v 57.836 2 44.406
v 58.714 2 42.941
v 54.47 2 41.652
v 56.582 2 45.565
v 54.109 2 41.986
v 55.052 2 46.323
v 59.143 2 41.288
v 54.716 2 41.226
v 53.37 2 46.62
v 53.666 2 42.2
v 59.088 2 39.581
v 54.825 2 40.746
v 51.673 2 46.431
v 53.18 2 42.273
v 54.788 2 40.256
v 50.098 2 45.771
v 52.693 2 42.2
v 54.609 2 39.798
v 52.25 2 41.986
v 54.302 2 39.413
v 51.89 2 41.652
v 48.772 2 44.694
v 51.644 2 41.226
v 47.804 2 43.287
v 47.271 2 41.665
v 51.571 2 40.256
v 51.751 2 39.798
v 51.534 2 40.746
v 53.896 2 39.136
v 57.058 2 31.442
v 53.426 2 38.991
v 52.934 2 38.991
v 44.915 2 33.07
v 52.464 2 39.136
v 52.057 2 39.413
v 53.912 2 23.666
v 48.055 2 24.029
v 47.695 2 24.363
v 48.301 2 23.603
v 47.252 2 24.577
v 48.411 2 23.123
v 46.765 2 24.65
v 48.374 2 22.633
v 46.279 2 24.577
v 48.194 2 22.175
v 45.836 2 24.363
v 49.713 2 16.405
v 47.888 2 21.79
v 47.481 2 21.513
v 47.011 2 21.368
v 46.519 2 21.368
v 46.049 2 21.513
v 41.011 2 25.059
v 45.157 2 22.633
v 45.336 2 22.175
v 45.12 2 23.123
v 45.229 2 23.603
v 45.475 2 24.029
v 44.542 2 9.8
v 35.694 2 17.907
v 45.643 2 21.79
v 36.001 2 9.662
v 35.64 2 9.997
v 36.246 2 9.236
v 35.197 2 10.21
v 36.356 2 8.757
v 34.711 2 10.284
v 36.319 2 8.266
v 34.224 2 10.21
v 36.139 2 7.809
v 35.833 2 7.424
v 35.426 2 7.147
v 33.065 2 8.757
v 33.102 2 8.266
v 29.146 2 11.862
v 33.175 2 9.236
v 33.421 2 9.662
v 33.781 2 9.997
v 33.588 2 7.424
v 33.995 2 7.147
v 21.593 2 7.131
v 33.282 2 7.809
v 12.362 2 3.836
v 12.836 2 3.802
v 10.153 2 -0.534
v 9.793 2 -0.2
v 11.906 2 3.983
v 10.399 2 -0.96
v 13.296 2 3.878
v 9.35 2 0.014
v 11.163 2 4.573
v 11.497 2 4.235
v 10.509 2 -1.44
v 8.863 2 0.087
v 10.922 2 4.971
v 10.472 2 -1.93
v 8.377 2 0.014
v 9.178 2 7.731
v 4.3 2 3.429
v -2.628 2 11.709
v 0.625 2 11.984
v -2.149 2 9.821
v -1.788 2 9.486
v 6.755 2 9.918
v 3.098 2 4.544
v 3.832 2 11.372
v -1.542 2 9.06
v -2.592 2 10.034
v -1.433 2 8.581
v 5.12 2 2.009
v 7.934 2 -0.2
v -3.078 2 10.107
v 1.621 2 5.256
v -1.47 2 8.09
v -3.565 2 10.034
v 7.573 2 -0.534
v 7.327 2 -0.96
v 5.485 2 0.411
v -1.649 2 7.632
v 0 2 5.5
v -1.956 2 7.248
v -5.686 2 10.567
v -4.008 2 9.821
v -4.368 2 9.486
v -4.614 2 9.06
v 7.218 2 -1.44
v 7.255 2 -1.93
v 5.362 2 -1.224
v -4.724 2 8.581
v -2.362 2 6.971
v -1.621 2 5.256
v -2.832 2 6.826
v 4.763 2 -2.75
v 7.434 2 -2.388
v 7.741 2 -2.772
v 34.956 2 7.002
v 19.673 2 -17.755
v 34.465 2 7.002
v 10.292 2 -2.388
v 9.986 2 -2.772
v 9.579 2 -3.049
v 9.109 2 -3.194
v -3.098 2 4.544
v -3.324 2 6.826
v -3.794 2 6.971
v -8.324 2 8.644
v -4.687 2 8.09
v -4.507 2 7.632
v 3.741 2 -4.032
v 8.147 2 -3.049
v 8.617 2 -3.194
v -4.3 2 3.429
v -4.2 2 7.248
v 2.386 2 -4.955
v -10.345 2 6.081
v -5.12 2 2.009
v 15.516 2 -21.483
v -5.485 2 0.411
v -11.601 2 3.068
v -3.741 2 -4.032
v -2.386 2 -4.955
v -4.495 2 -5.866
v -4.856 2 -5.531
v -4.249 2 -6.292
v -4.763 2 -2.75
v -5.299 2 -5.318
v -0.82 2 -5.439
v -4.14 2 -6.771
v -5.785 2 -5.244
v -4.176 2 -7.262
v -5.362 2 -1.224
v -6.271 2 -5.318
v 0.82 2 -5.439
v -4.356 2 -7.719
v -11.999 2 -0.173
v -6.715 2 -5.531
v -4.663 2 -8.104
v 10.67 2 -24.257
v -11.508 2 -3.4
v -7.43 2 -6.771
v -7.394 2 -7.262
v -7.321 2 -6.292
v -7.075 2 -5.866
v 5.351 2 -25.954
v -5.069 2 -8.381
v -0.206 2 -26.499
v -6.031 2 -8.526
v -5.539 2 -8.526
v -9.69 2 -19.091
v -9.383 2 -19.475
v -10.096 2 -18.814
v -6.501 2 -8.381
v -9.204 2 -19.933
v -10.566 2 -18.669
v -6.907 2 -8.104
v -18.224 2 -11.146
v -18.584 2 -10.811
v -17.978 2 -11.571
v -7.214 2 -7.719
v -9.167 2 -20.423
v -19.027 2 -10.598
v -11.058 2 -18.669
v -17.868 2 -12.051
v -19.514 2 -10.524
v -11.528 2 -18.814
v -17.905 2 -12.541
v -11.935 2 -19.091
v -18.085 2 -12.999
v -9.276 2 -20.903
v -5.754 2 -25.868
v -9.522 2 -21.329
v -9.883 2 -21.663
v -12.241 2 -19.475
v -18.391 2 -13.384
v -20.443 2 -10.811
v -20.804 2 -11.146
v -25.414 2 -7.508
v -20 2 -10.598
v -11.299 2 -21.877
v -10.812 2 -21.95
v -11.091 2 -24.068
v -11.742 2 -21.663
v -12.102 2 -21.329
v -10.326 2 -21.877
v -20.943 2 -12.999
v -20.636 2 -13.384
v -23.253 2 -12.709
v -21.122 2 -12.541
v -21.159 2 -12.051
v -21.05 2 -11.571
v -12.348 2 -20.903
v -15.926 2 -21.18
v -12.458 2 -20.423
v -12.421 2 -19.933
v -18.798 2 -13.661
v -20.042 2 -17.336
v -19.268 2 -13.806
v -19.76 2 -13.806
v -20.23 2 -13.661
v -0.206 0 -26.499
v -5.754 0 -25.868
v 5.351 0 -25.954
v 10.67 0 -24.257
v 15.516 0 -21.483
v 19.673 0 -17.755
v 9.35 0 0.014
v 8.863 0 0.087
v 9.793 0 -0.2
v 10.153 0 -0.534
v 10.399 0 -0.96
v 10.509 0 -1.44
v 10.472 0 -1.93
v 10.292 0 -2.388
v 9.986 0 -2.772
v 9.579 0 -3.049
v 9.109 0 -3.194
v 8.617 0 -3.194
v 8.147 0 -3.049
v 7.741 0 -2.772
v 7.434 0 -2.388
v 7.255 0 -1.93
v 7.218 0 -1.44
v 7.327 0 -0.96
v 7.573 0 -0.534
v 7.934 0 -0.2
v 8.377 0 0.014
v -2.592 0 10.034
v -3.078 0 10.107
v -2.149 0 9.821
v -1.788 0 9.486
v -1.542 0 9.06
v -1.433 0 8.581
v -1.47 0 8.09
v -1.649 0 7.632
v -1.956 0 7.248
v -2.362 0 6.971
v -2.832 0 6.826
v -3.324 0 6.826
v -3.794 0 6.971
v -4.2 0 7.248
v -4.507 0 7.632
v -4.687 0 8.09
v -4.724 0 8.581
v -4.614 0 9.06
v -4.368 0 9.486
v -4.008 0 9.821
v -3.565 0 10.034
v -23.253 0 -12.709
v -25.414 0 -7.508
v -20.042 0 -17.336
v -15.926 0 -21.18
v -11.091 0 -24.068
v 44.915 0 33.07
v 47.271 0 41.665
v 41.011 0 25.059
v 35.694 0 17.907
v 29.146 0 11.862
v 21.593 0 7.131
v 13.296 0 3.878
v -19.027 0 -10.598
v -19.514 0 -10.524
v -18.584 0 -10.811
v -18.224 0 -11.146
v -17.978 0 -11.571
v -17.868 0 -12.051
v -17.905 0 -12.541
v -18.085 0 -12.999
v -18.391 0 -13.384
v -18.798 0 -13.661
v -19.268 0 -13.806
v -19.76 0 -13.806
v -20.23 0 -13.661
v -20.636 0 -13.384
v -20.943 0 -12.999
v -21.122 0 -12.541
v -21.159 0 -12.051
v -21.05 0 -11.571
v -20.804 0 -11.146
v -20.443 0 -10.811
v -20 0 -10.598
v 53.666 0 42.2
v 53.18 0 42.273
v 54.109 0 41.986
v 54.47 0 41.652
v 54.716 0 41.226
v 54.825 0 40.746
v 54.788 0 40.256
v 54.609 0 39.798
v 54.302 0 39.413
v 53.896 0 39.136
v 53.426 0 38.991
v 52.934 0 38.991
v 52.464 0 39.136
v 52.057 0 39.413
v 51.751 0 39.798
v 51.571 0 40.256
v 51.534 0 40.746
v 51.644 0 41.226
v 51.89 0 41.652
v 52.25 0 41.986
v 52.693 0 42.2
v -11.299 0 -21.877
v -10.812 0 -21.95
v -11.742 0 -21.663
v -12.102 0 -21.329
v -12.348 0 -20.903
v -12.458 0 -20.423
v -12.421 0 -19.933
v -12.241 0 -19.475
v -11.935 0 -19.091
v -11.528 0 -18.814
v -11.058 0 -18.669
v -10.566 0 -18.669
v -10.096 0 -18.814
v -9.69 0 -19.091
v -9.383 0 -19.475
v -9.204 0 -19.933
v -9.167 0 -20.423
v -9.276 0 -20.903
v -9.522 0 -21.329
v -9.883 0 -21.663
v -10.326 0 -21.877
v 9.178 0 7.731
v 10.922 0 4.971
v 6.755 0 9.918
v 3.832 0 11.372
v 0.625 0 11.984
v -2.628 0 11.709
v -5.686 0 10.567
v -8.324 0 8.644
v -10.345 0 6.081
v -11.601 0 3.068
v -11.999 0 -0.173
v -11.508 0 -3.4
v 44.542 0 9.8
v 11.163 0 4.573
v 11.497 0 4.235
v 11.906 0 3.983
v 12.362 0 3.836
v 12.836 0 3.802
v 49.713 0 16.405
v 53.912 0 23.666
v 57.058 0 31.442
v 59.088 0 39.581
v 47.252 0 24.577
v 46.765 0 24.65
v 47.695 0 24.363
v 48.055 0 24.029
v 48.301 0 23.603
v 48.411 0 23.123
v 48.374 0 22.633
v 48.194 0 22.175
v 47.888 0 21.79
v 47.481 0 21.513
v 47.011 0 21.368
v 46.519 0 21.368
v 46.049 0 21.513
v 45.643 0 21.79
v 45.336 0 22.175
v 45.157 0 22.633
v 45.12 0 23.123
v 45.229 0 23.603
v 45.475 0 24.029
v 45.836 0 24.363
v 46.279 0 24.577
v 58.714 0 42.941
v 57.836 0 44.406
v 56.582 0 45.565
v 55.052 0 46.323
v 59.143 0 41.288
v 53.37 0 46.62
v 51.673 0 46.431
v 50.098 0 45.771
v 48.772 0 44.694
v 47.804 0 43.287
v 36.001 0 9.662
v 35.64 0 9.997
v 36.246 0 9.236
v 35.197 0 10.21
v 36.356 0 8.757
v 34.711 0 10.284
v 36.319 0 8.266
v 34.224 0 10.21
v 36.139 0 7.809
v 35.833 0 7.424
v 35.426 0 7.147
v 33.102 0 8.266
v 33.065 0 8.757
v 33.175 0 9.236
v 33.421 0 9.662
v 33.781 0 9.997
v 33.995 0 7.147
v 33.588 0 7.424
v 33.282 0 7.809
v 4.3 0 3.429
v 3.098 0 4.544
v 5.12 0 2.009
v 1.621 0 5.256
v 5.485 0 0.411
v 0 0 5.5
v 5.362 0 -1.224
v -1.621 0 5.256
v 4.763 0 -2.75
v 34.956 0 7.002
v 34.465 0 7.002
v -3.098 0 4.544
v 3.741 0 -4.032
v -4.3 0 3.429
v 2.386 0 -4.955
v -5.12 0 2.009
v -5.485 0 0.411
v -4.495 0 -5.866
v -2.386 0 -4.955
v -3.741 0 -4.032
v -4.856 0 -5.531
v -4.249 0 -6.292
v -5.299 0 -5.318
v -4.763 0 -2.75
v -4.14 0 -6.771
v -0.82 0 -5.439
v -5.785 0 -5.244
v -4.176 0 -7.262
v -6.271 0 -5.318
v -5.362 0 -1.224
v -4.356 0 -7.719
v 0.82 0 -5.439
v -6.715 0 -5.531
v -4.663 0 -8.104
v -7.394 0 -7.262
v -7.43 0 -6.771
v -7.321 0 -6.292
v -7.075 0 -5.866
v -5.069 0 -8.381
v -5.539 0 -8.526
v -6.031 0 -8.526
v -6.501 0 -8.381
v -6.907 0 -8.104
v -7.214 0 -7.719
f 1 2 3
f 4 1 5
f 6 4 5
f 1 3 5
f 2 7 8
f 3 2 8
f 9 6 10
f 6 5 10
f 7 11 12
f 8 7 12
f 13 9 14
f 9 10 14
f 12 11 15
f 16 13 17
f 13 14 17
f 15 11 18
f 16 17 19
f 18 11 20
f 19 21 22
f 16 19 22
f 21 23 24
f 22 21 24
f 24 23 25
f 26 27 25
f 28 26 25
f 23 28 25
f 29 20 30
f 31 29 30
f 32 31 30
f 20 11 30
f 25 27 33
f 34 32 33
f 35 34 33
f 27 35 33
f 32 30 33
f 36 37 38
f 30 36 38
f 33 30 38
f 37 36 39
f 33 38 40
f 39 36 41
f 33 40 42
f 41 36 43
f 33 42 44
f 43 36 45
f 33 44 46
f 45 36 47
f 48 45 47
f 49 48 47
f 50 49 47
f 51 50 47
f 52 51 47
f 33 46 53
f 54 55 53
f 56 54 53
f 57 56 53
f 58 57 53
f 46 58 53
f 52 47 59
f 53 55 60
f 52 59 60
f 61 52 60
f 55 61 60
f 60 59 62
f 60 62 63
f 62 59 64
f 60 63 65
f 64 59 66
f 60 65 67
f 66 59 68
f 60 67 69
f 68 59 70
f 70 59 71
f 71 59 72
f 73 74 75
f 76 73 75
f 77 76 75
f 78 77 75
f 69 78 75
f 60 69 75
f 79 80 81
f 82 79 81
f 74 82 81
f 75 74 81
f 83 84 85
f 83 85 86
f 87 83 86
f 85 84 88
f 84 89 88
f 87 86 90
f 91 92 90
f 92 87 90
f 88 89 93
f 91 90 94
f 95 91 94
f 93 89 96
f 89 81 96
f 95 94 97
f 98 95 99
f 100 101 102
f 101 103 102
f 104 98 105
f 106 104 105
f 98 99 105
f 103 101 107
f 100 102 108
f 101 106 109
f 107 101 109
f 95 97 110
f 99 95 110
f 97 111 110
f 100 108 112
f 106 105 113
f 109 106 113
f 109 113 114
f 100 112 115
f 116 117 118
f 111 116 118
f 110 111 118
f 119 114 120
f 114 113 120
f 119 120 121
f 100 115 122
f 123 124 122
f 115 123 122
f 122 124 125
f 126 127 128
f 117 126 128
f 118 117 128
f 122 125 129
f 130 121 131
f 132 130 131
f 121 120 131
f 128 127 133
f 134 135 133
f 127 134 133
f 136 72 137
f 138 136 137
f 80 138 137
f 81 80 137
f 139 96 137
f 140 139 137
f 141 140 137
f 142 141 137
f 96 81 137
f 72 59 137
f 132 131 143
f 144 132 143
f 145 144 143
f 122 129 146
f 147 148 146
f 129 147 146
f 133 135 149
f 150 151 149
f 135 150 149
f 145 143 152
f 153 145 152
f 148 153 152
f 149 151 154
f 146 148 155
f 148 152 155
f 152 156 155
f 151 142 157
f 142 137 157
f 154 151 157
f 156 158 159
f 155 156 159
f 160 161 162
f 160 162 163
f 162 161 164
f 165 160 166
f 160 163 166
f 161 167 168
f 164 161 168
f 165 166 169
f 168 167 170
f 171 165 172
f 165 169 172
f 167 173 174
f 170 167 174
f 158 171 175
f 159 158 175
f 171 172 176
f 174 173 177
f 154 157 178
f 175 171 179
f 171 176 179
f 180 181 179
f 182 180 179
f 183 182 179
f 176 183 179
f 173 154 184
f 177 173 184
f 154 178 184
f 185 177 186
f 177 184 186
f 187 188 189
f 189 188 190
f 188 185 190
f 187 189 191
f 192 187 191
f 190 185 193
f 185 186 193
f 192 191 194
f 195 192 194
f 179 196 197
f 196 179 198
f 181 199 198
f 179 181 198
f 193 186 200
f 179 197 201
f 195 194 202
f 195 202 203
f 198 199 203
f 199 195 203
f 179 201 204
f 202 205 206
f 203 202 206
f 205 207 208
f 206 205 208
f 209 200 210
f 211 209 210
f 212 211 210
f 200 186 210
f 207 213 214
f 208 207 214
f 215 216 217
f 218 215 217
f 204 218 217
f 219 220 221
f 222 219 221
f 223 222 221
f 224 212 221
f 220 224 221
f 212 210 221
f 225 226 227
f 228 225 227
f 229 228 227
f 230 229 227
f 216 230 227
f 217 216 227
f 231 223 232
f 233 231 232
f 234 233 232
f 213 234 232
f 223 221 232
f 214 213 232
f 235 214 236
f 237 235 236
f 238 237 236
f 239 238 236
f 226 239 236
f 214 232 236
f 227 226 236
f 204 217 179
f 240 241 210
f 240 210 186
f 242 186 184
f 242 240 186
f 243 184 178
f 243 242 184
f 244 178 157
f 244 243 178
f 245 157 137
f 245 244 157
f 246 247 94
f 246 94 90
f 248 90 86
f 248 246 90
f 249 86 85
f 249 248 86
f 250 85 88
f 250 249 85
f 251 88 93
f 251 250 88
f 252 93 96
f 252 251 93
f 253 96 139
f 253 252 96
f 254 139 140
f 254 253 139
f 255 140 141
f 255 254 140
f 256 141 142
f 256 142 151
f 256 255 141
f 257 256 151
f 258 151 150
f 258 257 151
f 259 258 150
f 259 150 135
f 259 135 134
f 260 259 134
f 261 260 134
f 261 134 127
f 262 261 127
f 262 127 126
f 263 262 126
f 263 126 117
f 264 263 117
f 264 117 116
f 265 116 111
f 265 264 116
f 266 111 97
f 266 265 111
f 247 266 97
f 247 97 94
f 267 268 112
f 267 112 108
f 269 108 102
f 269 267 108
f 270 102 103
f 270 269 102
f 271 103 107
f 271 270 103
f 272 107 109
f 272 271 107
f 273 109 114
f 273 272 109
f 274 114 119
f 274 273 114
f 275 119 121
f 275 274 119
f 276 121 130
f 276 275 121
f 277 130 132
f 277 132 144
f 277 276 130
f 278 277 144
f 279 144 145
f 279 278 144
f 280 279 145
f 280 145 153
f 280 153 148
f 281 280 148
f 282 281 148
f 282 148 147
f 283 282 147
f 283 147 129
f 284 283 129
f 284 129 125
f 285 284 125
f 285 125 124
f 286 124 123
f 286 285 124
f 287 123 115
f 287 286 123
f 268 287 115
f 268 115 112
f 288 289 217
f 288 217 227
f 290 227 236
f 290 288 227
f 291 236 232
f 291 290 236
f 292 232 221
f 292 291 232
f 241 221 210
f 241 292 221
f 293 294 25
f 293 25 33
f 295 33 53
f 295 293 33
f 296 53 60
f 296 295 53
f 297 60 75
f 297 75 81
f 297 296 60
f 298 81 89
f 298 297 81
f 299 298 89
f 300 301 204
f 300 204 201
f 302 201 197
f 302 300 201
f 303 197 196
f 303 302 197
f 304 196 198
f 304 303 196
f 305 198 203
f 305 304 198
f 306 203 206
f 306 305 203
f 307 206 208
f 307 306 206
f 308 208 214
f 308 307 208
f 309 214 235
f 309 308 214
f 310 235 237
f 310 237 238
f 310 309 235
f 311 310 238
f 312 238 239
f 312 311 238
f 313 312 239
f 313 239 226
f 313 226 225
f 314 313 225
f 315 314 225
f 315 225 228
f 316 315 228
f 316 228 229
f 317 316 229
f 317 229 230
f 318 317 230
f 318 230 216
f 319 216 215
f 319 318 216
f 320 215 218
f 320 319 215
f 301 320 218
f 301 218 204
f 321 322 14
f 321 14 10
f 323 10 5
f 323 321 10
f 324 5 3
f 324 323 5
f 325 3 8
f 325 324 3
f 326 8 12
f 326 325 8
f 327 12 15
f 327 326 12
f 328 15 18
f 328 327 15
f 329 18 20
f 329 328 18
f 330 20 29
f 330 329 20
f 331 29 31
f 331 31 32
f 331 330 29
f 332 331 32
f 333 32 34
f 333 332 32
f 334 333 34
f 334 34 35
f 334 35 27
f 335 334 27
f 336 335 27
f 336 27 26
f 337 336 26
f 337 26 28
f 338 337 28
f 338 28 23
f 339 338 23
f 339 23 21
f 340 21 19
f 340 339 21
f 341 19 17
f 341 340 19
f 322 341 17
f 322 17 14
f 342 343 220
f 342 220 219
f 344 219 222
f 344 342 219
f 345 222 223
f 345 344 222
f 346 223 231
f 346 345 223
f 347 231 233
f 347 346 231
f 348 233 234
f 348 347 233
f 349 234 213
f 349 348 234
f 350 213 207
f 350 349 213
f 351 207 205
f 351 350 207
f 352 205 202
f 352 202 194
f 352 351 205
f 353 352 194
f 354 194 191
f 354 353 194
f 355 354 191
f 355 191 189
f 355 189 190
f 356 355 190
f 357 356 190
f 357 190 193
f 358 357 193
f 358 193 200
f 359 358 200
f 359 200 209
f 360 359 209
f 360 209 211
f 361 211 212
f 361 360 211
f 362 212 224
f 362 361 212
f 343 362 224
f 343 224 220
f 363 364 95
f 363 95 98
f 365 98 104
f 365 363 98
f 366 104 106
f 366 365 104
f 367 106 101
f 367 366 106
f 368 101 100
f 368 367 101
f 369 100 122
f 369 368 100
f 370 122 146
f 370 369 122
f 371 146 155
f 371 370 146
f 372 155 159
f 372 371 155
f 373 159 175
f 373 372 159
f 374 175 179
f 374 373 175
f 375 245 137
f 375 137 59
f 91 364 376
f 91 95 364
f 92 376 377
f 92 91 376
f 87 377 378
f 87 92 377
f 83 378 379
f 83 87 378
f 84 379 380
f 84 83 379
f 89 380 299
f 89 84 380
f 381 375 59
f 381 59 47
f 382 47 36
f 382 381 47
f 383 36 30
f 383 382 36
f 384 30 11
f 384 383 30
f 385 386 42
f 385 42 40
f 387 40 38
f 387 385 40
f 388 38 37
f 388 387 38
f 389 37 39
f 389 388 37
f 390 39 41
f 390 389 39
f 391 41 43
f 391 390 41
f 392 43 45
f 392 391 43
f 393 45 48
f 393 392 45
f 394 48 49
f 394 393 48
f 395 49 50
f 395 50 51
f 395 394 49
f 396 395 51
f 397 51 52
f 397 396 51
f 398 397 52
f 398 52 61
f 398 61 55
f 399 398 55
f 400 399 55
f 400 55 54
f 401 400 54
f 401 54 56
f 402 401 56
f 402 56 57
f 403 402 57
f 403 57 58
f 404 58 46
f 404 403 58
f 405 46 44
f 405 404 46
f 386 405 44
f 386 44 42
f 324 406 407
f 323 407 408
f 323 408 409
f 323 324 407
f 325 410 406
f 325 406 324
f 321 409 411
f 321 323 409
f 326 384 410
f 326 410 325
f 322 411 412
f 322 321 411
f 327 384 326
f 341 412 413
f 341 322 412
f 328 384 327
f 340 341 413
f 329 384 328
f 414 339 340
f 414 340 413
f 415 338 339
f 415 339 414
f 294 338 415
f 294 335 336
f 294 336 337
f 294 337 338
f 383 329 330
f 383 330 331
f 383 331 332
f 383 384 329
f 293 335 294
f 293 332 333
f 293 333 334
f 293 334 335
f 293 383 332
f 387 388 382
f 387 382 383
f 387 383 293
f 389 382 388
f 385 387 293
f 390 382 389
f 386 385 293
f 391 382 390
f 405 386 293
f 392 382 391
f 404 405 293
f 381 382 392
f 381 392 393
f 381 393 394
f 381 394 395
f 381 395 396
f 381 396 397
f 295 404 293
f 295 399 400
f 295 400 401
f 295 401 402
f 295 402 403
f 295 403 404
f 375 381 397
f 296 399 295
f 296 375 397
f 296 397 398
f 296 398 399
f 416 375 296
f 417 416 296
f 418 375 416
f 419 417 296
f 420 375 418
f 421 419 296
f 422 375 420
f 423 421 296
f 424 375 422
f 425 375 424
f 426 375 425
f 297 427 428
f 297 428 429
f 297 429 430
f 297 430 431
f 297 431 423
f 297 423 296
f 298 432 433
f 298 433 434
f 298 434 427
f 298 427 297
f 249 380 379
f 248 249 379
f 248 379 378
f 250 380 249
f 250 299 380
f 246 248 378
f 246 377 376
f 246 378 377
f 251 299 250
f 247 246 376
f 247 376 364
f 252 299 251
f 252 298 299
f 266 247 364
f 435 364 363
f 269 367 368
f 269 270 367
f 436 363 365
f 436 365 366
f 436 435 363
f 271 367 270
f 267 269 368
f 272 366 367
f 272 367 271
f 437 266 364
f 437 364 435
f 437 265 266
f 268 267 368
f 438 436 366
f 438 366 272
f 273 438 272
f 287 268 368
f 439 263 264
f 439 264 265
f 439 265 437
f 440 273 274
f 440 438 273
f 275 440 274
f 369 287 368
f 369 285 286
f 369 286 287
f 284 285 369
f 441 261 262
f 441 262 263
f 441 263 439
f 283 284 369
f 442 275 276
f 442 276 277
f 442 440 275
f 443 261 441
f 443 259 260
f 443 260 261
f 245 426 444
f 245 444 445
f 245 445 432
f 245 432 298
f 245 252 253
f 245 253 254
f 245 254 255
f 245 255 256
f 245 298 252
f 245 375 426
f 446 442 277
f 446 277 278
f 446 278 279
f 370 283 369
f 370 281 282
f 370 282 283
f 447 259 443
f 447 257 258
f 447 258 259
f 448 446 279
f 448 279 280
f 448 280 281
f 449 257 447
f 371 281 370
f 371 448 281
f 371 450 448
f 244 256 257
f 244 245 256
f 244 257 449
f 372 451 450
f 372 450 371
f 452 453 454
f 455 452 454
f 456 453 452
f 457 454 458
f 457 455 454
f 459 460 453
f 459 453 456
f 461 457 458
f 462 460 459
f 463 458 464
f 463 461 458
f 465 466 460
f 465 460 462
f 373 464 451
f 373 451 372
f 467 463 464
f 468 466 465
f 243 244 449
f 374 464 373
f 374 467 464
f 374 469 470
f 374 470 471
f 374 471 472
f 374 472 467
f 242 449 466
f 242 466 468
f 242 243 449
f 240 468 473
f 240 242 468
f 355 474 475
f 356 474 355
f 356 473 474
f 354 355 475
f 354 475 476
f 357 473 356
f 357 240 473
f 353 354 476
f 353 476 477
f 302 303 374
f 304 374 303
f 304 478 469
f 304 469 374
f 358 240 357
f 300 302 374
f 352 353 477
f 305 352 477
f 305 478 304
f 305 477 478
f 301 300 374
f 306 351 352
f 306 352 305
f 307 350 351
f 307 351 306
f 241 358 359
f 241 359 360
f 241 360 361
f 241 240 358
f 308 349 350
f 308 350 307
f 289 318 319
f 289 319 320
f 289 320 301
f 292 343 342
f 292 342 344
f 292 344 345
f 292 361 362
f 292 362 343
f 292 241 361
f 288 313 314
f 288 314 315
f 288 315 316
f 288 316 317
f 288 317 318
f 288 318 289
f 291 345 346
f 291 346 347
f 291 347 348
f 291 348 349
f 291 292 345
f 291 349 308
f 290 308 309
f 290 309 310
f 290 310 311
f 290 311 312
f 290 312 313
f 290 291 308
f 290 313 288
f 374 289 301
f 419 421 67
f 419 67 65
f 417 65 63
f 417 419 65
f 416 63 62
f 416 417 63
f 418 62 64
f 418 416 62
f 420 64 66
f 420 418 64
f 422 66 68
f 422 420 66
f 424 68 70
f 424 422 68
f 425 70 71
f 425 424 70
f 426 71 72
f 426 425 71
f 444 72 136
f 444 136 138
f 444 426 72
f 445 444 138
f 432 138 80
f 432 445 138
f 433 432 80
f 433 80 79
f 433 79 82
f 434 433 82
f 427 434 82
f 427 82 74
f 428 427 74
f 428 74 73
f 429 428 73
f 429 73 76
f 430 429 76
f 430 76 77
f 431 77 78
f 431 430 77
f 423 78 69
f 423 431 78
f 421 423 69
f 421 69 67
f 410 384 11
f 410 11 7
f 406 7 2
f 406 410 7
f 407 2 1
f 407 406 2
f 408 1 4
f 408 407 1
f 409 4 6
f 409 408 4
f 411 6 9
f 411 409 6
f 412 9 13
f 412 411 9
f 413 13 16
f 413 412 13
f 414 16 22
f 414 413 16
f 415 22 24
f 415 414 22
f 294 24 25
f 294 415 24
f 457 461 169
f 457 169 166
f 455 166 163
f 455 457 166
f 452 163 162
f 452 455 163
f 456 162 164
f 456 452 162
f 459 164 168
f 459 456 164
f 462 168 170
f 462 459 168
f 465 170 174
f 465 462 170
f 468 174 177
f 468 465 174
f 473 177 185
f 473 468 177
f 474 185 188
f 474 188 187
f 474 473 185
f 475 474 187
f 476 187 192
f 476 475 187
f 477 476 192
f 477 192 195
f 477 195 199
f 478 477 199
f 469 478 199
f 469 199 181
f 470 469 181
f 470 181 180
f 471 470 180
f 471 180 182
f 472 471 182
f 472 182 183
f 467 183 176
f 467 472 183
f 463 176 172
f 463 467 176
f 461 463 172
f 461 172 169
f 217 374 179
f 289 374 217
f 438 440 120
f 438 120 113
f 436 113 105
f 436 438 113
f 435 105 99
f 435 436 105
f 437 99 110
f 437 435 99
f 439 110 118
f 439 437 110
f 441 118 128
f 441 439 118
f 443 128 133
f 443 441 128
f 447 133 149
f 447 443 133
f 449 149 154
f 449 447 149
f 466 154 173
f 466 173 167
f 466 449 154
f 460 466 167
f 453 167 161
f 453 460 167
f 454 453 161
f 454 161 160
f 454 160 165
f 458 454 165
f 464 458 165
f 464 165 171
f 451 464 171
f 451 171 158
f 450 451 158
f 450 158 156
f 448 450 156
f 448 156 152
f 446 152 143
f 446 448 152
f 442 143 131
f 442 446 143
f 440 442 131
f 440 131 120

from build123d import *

# Parameters (mm, degrees)
SKETCH_1_R         = 1.65
SKETCH_1_R_2       = 5.5
EXTRUDE_2450_DEPTH = 2
FILLET_1_R         = 2


with BuildPart() as part:
    # Эскиз1 → Extrude 2450 (new body)
    with BuildSketch(Plane(origin=(0, 0, 0), x_dir=(1, 0, 0), z_dir=(0, 1, 0))):
        with BuildLine():
            Line((-11.508257905, 3.4), (-25.414069539, 7.508333333))
            ThreePointArc((-25.414069539, 7.508333333), (-18.086736192, 19.368014197), (-5.754049101, 25.86775829))
            ThreePointArc((-5.754049101, 25.86775829), (8.055154344, 25.246078676), (19.6725691, 17.755))
            Line((19.6725691, 17.755), (44.541665887, -9.8))
            ThreePointArc((44.541665887, -9.8), (53.912240119, -23.666174502), (59.088465181, -39.58110934))
            ThreePointArc((59.088465181, -39.58110934), (54.221507729, -46.531844924), (47.270772145, -41.664887472))
            ThreePointArc((47.270772145, -41.664887472), (35.068418794, -17.224917951), (11.508257905, -3.4))
            ThreePointArc((11.508257905, -3.4), (-3.4, -11.508257905), (-11.508257905, 3.4))
        make_face()
        with Locations(Location((-5.785088487, 6.894399988, 0), (0, 0, 270))):
            Circle(SKETCH_1_R, mode=Mode.SUBTRACT)
        with Locations(Location((8.863269777, 1.562833599, 0), (0, 0, 270))):
            Circle(SKETCH_1_R, mode=Mode.SUBTRACT)
        with Locations(Location((0, 0, 0), (0, 0, 270))):
            Circle(SKETCH_1_R_2, mode=Mode.SUBTRACT)
        with Locations(Location((-3.07818129, -8.457233587, 0), (0, 0, 270))):
            Circle(SKETCH_1_R, mode=Mode.SUBTRACT)
        with Locations(Location((-19.513769828, 12.174267415, 0), (0, 0, 270))):
            Circle(SKETCH_1_R, mode=Mode.SUBTRACT)
        with Locations(Location((-10.812286687, 20.300109768, 0), (0, 0, 90))):
            Circle(SKETCH_1_R, mode=Mode.SUBTRACT)
        with Locations(Location((53.179618663, -40.622998406, 0), (0, 0, 270))):
            Circle(SKETCH_1_R, mode=Mode.SUBTRACT)
        with Locations(Location((46.765371804, -23, 0), (0, 0, 270))):
            Circle(SKETCH_1_R, mode=Mode.SUBTRACT)
        with Locations(Location((34.710530923, -8.633600072, 0), (0, 0, 270))):
            Circle(SKETCH_1_R, mode=Mode.SUBTRACT)
    extrude(amount=EXTRUDE_2450_DEPTH)

    # Скругление1
    fillet_1_edges = [part.edges().sort_by_distance(p)[0] for p in [
        (11.508257905, 1, 3.4),
    ]]
    fillet(fillet_1_edges, radius=FILLET_1_R)


solid = part.part
